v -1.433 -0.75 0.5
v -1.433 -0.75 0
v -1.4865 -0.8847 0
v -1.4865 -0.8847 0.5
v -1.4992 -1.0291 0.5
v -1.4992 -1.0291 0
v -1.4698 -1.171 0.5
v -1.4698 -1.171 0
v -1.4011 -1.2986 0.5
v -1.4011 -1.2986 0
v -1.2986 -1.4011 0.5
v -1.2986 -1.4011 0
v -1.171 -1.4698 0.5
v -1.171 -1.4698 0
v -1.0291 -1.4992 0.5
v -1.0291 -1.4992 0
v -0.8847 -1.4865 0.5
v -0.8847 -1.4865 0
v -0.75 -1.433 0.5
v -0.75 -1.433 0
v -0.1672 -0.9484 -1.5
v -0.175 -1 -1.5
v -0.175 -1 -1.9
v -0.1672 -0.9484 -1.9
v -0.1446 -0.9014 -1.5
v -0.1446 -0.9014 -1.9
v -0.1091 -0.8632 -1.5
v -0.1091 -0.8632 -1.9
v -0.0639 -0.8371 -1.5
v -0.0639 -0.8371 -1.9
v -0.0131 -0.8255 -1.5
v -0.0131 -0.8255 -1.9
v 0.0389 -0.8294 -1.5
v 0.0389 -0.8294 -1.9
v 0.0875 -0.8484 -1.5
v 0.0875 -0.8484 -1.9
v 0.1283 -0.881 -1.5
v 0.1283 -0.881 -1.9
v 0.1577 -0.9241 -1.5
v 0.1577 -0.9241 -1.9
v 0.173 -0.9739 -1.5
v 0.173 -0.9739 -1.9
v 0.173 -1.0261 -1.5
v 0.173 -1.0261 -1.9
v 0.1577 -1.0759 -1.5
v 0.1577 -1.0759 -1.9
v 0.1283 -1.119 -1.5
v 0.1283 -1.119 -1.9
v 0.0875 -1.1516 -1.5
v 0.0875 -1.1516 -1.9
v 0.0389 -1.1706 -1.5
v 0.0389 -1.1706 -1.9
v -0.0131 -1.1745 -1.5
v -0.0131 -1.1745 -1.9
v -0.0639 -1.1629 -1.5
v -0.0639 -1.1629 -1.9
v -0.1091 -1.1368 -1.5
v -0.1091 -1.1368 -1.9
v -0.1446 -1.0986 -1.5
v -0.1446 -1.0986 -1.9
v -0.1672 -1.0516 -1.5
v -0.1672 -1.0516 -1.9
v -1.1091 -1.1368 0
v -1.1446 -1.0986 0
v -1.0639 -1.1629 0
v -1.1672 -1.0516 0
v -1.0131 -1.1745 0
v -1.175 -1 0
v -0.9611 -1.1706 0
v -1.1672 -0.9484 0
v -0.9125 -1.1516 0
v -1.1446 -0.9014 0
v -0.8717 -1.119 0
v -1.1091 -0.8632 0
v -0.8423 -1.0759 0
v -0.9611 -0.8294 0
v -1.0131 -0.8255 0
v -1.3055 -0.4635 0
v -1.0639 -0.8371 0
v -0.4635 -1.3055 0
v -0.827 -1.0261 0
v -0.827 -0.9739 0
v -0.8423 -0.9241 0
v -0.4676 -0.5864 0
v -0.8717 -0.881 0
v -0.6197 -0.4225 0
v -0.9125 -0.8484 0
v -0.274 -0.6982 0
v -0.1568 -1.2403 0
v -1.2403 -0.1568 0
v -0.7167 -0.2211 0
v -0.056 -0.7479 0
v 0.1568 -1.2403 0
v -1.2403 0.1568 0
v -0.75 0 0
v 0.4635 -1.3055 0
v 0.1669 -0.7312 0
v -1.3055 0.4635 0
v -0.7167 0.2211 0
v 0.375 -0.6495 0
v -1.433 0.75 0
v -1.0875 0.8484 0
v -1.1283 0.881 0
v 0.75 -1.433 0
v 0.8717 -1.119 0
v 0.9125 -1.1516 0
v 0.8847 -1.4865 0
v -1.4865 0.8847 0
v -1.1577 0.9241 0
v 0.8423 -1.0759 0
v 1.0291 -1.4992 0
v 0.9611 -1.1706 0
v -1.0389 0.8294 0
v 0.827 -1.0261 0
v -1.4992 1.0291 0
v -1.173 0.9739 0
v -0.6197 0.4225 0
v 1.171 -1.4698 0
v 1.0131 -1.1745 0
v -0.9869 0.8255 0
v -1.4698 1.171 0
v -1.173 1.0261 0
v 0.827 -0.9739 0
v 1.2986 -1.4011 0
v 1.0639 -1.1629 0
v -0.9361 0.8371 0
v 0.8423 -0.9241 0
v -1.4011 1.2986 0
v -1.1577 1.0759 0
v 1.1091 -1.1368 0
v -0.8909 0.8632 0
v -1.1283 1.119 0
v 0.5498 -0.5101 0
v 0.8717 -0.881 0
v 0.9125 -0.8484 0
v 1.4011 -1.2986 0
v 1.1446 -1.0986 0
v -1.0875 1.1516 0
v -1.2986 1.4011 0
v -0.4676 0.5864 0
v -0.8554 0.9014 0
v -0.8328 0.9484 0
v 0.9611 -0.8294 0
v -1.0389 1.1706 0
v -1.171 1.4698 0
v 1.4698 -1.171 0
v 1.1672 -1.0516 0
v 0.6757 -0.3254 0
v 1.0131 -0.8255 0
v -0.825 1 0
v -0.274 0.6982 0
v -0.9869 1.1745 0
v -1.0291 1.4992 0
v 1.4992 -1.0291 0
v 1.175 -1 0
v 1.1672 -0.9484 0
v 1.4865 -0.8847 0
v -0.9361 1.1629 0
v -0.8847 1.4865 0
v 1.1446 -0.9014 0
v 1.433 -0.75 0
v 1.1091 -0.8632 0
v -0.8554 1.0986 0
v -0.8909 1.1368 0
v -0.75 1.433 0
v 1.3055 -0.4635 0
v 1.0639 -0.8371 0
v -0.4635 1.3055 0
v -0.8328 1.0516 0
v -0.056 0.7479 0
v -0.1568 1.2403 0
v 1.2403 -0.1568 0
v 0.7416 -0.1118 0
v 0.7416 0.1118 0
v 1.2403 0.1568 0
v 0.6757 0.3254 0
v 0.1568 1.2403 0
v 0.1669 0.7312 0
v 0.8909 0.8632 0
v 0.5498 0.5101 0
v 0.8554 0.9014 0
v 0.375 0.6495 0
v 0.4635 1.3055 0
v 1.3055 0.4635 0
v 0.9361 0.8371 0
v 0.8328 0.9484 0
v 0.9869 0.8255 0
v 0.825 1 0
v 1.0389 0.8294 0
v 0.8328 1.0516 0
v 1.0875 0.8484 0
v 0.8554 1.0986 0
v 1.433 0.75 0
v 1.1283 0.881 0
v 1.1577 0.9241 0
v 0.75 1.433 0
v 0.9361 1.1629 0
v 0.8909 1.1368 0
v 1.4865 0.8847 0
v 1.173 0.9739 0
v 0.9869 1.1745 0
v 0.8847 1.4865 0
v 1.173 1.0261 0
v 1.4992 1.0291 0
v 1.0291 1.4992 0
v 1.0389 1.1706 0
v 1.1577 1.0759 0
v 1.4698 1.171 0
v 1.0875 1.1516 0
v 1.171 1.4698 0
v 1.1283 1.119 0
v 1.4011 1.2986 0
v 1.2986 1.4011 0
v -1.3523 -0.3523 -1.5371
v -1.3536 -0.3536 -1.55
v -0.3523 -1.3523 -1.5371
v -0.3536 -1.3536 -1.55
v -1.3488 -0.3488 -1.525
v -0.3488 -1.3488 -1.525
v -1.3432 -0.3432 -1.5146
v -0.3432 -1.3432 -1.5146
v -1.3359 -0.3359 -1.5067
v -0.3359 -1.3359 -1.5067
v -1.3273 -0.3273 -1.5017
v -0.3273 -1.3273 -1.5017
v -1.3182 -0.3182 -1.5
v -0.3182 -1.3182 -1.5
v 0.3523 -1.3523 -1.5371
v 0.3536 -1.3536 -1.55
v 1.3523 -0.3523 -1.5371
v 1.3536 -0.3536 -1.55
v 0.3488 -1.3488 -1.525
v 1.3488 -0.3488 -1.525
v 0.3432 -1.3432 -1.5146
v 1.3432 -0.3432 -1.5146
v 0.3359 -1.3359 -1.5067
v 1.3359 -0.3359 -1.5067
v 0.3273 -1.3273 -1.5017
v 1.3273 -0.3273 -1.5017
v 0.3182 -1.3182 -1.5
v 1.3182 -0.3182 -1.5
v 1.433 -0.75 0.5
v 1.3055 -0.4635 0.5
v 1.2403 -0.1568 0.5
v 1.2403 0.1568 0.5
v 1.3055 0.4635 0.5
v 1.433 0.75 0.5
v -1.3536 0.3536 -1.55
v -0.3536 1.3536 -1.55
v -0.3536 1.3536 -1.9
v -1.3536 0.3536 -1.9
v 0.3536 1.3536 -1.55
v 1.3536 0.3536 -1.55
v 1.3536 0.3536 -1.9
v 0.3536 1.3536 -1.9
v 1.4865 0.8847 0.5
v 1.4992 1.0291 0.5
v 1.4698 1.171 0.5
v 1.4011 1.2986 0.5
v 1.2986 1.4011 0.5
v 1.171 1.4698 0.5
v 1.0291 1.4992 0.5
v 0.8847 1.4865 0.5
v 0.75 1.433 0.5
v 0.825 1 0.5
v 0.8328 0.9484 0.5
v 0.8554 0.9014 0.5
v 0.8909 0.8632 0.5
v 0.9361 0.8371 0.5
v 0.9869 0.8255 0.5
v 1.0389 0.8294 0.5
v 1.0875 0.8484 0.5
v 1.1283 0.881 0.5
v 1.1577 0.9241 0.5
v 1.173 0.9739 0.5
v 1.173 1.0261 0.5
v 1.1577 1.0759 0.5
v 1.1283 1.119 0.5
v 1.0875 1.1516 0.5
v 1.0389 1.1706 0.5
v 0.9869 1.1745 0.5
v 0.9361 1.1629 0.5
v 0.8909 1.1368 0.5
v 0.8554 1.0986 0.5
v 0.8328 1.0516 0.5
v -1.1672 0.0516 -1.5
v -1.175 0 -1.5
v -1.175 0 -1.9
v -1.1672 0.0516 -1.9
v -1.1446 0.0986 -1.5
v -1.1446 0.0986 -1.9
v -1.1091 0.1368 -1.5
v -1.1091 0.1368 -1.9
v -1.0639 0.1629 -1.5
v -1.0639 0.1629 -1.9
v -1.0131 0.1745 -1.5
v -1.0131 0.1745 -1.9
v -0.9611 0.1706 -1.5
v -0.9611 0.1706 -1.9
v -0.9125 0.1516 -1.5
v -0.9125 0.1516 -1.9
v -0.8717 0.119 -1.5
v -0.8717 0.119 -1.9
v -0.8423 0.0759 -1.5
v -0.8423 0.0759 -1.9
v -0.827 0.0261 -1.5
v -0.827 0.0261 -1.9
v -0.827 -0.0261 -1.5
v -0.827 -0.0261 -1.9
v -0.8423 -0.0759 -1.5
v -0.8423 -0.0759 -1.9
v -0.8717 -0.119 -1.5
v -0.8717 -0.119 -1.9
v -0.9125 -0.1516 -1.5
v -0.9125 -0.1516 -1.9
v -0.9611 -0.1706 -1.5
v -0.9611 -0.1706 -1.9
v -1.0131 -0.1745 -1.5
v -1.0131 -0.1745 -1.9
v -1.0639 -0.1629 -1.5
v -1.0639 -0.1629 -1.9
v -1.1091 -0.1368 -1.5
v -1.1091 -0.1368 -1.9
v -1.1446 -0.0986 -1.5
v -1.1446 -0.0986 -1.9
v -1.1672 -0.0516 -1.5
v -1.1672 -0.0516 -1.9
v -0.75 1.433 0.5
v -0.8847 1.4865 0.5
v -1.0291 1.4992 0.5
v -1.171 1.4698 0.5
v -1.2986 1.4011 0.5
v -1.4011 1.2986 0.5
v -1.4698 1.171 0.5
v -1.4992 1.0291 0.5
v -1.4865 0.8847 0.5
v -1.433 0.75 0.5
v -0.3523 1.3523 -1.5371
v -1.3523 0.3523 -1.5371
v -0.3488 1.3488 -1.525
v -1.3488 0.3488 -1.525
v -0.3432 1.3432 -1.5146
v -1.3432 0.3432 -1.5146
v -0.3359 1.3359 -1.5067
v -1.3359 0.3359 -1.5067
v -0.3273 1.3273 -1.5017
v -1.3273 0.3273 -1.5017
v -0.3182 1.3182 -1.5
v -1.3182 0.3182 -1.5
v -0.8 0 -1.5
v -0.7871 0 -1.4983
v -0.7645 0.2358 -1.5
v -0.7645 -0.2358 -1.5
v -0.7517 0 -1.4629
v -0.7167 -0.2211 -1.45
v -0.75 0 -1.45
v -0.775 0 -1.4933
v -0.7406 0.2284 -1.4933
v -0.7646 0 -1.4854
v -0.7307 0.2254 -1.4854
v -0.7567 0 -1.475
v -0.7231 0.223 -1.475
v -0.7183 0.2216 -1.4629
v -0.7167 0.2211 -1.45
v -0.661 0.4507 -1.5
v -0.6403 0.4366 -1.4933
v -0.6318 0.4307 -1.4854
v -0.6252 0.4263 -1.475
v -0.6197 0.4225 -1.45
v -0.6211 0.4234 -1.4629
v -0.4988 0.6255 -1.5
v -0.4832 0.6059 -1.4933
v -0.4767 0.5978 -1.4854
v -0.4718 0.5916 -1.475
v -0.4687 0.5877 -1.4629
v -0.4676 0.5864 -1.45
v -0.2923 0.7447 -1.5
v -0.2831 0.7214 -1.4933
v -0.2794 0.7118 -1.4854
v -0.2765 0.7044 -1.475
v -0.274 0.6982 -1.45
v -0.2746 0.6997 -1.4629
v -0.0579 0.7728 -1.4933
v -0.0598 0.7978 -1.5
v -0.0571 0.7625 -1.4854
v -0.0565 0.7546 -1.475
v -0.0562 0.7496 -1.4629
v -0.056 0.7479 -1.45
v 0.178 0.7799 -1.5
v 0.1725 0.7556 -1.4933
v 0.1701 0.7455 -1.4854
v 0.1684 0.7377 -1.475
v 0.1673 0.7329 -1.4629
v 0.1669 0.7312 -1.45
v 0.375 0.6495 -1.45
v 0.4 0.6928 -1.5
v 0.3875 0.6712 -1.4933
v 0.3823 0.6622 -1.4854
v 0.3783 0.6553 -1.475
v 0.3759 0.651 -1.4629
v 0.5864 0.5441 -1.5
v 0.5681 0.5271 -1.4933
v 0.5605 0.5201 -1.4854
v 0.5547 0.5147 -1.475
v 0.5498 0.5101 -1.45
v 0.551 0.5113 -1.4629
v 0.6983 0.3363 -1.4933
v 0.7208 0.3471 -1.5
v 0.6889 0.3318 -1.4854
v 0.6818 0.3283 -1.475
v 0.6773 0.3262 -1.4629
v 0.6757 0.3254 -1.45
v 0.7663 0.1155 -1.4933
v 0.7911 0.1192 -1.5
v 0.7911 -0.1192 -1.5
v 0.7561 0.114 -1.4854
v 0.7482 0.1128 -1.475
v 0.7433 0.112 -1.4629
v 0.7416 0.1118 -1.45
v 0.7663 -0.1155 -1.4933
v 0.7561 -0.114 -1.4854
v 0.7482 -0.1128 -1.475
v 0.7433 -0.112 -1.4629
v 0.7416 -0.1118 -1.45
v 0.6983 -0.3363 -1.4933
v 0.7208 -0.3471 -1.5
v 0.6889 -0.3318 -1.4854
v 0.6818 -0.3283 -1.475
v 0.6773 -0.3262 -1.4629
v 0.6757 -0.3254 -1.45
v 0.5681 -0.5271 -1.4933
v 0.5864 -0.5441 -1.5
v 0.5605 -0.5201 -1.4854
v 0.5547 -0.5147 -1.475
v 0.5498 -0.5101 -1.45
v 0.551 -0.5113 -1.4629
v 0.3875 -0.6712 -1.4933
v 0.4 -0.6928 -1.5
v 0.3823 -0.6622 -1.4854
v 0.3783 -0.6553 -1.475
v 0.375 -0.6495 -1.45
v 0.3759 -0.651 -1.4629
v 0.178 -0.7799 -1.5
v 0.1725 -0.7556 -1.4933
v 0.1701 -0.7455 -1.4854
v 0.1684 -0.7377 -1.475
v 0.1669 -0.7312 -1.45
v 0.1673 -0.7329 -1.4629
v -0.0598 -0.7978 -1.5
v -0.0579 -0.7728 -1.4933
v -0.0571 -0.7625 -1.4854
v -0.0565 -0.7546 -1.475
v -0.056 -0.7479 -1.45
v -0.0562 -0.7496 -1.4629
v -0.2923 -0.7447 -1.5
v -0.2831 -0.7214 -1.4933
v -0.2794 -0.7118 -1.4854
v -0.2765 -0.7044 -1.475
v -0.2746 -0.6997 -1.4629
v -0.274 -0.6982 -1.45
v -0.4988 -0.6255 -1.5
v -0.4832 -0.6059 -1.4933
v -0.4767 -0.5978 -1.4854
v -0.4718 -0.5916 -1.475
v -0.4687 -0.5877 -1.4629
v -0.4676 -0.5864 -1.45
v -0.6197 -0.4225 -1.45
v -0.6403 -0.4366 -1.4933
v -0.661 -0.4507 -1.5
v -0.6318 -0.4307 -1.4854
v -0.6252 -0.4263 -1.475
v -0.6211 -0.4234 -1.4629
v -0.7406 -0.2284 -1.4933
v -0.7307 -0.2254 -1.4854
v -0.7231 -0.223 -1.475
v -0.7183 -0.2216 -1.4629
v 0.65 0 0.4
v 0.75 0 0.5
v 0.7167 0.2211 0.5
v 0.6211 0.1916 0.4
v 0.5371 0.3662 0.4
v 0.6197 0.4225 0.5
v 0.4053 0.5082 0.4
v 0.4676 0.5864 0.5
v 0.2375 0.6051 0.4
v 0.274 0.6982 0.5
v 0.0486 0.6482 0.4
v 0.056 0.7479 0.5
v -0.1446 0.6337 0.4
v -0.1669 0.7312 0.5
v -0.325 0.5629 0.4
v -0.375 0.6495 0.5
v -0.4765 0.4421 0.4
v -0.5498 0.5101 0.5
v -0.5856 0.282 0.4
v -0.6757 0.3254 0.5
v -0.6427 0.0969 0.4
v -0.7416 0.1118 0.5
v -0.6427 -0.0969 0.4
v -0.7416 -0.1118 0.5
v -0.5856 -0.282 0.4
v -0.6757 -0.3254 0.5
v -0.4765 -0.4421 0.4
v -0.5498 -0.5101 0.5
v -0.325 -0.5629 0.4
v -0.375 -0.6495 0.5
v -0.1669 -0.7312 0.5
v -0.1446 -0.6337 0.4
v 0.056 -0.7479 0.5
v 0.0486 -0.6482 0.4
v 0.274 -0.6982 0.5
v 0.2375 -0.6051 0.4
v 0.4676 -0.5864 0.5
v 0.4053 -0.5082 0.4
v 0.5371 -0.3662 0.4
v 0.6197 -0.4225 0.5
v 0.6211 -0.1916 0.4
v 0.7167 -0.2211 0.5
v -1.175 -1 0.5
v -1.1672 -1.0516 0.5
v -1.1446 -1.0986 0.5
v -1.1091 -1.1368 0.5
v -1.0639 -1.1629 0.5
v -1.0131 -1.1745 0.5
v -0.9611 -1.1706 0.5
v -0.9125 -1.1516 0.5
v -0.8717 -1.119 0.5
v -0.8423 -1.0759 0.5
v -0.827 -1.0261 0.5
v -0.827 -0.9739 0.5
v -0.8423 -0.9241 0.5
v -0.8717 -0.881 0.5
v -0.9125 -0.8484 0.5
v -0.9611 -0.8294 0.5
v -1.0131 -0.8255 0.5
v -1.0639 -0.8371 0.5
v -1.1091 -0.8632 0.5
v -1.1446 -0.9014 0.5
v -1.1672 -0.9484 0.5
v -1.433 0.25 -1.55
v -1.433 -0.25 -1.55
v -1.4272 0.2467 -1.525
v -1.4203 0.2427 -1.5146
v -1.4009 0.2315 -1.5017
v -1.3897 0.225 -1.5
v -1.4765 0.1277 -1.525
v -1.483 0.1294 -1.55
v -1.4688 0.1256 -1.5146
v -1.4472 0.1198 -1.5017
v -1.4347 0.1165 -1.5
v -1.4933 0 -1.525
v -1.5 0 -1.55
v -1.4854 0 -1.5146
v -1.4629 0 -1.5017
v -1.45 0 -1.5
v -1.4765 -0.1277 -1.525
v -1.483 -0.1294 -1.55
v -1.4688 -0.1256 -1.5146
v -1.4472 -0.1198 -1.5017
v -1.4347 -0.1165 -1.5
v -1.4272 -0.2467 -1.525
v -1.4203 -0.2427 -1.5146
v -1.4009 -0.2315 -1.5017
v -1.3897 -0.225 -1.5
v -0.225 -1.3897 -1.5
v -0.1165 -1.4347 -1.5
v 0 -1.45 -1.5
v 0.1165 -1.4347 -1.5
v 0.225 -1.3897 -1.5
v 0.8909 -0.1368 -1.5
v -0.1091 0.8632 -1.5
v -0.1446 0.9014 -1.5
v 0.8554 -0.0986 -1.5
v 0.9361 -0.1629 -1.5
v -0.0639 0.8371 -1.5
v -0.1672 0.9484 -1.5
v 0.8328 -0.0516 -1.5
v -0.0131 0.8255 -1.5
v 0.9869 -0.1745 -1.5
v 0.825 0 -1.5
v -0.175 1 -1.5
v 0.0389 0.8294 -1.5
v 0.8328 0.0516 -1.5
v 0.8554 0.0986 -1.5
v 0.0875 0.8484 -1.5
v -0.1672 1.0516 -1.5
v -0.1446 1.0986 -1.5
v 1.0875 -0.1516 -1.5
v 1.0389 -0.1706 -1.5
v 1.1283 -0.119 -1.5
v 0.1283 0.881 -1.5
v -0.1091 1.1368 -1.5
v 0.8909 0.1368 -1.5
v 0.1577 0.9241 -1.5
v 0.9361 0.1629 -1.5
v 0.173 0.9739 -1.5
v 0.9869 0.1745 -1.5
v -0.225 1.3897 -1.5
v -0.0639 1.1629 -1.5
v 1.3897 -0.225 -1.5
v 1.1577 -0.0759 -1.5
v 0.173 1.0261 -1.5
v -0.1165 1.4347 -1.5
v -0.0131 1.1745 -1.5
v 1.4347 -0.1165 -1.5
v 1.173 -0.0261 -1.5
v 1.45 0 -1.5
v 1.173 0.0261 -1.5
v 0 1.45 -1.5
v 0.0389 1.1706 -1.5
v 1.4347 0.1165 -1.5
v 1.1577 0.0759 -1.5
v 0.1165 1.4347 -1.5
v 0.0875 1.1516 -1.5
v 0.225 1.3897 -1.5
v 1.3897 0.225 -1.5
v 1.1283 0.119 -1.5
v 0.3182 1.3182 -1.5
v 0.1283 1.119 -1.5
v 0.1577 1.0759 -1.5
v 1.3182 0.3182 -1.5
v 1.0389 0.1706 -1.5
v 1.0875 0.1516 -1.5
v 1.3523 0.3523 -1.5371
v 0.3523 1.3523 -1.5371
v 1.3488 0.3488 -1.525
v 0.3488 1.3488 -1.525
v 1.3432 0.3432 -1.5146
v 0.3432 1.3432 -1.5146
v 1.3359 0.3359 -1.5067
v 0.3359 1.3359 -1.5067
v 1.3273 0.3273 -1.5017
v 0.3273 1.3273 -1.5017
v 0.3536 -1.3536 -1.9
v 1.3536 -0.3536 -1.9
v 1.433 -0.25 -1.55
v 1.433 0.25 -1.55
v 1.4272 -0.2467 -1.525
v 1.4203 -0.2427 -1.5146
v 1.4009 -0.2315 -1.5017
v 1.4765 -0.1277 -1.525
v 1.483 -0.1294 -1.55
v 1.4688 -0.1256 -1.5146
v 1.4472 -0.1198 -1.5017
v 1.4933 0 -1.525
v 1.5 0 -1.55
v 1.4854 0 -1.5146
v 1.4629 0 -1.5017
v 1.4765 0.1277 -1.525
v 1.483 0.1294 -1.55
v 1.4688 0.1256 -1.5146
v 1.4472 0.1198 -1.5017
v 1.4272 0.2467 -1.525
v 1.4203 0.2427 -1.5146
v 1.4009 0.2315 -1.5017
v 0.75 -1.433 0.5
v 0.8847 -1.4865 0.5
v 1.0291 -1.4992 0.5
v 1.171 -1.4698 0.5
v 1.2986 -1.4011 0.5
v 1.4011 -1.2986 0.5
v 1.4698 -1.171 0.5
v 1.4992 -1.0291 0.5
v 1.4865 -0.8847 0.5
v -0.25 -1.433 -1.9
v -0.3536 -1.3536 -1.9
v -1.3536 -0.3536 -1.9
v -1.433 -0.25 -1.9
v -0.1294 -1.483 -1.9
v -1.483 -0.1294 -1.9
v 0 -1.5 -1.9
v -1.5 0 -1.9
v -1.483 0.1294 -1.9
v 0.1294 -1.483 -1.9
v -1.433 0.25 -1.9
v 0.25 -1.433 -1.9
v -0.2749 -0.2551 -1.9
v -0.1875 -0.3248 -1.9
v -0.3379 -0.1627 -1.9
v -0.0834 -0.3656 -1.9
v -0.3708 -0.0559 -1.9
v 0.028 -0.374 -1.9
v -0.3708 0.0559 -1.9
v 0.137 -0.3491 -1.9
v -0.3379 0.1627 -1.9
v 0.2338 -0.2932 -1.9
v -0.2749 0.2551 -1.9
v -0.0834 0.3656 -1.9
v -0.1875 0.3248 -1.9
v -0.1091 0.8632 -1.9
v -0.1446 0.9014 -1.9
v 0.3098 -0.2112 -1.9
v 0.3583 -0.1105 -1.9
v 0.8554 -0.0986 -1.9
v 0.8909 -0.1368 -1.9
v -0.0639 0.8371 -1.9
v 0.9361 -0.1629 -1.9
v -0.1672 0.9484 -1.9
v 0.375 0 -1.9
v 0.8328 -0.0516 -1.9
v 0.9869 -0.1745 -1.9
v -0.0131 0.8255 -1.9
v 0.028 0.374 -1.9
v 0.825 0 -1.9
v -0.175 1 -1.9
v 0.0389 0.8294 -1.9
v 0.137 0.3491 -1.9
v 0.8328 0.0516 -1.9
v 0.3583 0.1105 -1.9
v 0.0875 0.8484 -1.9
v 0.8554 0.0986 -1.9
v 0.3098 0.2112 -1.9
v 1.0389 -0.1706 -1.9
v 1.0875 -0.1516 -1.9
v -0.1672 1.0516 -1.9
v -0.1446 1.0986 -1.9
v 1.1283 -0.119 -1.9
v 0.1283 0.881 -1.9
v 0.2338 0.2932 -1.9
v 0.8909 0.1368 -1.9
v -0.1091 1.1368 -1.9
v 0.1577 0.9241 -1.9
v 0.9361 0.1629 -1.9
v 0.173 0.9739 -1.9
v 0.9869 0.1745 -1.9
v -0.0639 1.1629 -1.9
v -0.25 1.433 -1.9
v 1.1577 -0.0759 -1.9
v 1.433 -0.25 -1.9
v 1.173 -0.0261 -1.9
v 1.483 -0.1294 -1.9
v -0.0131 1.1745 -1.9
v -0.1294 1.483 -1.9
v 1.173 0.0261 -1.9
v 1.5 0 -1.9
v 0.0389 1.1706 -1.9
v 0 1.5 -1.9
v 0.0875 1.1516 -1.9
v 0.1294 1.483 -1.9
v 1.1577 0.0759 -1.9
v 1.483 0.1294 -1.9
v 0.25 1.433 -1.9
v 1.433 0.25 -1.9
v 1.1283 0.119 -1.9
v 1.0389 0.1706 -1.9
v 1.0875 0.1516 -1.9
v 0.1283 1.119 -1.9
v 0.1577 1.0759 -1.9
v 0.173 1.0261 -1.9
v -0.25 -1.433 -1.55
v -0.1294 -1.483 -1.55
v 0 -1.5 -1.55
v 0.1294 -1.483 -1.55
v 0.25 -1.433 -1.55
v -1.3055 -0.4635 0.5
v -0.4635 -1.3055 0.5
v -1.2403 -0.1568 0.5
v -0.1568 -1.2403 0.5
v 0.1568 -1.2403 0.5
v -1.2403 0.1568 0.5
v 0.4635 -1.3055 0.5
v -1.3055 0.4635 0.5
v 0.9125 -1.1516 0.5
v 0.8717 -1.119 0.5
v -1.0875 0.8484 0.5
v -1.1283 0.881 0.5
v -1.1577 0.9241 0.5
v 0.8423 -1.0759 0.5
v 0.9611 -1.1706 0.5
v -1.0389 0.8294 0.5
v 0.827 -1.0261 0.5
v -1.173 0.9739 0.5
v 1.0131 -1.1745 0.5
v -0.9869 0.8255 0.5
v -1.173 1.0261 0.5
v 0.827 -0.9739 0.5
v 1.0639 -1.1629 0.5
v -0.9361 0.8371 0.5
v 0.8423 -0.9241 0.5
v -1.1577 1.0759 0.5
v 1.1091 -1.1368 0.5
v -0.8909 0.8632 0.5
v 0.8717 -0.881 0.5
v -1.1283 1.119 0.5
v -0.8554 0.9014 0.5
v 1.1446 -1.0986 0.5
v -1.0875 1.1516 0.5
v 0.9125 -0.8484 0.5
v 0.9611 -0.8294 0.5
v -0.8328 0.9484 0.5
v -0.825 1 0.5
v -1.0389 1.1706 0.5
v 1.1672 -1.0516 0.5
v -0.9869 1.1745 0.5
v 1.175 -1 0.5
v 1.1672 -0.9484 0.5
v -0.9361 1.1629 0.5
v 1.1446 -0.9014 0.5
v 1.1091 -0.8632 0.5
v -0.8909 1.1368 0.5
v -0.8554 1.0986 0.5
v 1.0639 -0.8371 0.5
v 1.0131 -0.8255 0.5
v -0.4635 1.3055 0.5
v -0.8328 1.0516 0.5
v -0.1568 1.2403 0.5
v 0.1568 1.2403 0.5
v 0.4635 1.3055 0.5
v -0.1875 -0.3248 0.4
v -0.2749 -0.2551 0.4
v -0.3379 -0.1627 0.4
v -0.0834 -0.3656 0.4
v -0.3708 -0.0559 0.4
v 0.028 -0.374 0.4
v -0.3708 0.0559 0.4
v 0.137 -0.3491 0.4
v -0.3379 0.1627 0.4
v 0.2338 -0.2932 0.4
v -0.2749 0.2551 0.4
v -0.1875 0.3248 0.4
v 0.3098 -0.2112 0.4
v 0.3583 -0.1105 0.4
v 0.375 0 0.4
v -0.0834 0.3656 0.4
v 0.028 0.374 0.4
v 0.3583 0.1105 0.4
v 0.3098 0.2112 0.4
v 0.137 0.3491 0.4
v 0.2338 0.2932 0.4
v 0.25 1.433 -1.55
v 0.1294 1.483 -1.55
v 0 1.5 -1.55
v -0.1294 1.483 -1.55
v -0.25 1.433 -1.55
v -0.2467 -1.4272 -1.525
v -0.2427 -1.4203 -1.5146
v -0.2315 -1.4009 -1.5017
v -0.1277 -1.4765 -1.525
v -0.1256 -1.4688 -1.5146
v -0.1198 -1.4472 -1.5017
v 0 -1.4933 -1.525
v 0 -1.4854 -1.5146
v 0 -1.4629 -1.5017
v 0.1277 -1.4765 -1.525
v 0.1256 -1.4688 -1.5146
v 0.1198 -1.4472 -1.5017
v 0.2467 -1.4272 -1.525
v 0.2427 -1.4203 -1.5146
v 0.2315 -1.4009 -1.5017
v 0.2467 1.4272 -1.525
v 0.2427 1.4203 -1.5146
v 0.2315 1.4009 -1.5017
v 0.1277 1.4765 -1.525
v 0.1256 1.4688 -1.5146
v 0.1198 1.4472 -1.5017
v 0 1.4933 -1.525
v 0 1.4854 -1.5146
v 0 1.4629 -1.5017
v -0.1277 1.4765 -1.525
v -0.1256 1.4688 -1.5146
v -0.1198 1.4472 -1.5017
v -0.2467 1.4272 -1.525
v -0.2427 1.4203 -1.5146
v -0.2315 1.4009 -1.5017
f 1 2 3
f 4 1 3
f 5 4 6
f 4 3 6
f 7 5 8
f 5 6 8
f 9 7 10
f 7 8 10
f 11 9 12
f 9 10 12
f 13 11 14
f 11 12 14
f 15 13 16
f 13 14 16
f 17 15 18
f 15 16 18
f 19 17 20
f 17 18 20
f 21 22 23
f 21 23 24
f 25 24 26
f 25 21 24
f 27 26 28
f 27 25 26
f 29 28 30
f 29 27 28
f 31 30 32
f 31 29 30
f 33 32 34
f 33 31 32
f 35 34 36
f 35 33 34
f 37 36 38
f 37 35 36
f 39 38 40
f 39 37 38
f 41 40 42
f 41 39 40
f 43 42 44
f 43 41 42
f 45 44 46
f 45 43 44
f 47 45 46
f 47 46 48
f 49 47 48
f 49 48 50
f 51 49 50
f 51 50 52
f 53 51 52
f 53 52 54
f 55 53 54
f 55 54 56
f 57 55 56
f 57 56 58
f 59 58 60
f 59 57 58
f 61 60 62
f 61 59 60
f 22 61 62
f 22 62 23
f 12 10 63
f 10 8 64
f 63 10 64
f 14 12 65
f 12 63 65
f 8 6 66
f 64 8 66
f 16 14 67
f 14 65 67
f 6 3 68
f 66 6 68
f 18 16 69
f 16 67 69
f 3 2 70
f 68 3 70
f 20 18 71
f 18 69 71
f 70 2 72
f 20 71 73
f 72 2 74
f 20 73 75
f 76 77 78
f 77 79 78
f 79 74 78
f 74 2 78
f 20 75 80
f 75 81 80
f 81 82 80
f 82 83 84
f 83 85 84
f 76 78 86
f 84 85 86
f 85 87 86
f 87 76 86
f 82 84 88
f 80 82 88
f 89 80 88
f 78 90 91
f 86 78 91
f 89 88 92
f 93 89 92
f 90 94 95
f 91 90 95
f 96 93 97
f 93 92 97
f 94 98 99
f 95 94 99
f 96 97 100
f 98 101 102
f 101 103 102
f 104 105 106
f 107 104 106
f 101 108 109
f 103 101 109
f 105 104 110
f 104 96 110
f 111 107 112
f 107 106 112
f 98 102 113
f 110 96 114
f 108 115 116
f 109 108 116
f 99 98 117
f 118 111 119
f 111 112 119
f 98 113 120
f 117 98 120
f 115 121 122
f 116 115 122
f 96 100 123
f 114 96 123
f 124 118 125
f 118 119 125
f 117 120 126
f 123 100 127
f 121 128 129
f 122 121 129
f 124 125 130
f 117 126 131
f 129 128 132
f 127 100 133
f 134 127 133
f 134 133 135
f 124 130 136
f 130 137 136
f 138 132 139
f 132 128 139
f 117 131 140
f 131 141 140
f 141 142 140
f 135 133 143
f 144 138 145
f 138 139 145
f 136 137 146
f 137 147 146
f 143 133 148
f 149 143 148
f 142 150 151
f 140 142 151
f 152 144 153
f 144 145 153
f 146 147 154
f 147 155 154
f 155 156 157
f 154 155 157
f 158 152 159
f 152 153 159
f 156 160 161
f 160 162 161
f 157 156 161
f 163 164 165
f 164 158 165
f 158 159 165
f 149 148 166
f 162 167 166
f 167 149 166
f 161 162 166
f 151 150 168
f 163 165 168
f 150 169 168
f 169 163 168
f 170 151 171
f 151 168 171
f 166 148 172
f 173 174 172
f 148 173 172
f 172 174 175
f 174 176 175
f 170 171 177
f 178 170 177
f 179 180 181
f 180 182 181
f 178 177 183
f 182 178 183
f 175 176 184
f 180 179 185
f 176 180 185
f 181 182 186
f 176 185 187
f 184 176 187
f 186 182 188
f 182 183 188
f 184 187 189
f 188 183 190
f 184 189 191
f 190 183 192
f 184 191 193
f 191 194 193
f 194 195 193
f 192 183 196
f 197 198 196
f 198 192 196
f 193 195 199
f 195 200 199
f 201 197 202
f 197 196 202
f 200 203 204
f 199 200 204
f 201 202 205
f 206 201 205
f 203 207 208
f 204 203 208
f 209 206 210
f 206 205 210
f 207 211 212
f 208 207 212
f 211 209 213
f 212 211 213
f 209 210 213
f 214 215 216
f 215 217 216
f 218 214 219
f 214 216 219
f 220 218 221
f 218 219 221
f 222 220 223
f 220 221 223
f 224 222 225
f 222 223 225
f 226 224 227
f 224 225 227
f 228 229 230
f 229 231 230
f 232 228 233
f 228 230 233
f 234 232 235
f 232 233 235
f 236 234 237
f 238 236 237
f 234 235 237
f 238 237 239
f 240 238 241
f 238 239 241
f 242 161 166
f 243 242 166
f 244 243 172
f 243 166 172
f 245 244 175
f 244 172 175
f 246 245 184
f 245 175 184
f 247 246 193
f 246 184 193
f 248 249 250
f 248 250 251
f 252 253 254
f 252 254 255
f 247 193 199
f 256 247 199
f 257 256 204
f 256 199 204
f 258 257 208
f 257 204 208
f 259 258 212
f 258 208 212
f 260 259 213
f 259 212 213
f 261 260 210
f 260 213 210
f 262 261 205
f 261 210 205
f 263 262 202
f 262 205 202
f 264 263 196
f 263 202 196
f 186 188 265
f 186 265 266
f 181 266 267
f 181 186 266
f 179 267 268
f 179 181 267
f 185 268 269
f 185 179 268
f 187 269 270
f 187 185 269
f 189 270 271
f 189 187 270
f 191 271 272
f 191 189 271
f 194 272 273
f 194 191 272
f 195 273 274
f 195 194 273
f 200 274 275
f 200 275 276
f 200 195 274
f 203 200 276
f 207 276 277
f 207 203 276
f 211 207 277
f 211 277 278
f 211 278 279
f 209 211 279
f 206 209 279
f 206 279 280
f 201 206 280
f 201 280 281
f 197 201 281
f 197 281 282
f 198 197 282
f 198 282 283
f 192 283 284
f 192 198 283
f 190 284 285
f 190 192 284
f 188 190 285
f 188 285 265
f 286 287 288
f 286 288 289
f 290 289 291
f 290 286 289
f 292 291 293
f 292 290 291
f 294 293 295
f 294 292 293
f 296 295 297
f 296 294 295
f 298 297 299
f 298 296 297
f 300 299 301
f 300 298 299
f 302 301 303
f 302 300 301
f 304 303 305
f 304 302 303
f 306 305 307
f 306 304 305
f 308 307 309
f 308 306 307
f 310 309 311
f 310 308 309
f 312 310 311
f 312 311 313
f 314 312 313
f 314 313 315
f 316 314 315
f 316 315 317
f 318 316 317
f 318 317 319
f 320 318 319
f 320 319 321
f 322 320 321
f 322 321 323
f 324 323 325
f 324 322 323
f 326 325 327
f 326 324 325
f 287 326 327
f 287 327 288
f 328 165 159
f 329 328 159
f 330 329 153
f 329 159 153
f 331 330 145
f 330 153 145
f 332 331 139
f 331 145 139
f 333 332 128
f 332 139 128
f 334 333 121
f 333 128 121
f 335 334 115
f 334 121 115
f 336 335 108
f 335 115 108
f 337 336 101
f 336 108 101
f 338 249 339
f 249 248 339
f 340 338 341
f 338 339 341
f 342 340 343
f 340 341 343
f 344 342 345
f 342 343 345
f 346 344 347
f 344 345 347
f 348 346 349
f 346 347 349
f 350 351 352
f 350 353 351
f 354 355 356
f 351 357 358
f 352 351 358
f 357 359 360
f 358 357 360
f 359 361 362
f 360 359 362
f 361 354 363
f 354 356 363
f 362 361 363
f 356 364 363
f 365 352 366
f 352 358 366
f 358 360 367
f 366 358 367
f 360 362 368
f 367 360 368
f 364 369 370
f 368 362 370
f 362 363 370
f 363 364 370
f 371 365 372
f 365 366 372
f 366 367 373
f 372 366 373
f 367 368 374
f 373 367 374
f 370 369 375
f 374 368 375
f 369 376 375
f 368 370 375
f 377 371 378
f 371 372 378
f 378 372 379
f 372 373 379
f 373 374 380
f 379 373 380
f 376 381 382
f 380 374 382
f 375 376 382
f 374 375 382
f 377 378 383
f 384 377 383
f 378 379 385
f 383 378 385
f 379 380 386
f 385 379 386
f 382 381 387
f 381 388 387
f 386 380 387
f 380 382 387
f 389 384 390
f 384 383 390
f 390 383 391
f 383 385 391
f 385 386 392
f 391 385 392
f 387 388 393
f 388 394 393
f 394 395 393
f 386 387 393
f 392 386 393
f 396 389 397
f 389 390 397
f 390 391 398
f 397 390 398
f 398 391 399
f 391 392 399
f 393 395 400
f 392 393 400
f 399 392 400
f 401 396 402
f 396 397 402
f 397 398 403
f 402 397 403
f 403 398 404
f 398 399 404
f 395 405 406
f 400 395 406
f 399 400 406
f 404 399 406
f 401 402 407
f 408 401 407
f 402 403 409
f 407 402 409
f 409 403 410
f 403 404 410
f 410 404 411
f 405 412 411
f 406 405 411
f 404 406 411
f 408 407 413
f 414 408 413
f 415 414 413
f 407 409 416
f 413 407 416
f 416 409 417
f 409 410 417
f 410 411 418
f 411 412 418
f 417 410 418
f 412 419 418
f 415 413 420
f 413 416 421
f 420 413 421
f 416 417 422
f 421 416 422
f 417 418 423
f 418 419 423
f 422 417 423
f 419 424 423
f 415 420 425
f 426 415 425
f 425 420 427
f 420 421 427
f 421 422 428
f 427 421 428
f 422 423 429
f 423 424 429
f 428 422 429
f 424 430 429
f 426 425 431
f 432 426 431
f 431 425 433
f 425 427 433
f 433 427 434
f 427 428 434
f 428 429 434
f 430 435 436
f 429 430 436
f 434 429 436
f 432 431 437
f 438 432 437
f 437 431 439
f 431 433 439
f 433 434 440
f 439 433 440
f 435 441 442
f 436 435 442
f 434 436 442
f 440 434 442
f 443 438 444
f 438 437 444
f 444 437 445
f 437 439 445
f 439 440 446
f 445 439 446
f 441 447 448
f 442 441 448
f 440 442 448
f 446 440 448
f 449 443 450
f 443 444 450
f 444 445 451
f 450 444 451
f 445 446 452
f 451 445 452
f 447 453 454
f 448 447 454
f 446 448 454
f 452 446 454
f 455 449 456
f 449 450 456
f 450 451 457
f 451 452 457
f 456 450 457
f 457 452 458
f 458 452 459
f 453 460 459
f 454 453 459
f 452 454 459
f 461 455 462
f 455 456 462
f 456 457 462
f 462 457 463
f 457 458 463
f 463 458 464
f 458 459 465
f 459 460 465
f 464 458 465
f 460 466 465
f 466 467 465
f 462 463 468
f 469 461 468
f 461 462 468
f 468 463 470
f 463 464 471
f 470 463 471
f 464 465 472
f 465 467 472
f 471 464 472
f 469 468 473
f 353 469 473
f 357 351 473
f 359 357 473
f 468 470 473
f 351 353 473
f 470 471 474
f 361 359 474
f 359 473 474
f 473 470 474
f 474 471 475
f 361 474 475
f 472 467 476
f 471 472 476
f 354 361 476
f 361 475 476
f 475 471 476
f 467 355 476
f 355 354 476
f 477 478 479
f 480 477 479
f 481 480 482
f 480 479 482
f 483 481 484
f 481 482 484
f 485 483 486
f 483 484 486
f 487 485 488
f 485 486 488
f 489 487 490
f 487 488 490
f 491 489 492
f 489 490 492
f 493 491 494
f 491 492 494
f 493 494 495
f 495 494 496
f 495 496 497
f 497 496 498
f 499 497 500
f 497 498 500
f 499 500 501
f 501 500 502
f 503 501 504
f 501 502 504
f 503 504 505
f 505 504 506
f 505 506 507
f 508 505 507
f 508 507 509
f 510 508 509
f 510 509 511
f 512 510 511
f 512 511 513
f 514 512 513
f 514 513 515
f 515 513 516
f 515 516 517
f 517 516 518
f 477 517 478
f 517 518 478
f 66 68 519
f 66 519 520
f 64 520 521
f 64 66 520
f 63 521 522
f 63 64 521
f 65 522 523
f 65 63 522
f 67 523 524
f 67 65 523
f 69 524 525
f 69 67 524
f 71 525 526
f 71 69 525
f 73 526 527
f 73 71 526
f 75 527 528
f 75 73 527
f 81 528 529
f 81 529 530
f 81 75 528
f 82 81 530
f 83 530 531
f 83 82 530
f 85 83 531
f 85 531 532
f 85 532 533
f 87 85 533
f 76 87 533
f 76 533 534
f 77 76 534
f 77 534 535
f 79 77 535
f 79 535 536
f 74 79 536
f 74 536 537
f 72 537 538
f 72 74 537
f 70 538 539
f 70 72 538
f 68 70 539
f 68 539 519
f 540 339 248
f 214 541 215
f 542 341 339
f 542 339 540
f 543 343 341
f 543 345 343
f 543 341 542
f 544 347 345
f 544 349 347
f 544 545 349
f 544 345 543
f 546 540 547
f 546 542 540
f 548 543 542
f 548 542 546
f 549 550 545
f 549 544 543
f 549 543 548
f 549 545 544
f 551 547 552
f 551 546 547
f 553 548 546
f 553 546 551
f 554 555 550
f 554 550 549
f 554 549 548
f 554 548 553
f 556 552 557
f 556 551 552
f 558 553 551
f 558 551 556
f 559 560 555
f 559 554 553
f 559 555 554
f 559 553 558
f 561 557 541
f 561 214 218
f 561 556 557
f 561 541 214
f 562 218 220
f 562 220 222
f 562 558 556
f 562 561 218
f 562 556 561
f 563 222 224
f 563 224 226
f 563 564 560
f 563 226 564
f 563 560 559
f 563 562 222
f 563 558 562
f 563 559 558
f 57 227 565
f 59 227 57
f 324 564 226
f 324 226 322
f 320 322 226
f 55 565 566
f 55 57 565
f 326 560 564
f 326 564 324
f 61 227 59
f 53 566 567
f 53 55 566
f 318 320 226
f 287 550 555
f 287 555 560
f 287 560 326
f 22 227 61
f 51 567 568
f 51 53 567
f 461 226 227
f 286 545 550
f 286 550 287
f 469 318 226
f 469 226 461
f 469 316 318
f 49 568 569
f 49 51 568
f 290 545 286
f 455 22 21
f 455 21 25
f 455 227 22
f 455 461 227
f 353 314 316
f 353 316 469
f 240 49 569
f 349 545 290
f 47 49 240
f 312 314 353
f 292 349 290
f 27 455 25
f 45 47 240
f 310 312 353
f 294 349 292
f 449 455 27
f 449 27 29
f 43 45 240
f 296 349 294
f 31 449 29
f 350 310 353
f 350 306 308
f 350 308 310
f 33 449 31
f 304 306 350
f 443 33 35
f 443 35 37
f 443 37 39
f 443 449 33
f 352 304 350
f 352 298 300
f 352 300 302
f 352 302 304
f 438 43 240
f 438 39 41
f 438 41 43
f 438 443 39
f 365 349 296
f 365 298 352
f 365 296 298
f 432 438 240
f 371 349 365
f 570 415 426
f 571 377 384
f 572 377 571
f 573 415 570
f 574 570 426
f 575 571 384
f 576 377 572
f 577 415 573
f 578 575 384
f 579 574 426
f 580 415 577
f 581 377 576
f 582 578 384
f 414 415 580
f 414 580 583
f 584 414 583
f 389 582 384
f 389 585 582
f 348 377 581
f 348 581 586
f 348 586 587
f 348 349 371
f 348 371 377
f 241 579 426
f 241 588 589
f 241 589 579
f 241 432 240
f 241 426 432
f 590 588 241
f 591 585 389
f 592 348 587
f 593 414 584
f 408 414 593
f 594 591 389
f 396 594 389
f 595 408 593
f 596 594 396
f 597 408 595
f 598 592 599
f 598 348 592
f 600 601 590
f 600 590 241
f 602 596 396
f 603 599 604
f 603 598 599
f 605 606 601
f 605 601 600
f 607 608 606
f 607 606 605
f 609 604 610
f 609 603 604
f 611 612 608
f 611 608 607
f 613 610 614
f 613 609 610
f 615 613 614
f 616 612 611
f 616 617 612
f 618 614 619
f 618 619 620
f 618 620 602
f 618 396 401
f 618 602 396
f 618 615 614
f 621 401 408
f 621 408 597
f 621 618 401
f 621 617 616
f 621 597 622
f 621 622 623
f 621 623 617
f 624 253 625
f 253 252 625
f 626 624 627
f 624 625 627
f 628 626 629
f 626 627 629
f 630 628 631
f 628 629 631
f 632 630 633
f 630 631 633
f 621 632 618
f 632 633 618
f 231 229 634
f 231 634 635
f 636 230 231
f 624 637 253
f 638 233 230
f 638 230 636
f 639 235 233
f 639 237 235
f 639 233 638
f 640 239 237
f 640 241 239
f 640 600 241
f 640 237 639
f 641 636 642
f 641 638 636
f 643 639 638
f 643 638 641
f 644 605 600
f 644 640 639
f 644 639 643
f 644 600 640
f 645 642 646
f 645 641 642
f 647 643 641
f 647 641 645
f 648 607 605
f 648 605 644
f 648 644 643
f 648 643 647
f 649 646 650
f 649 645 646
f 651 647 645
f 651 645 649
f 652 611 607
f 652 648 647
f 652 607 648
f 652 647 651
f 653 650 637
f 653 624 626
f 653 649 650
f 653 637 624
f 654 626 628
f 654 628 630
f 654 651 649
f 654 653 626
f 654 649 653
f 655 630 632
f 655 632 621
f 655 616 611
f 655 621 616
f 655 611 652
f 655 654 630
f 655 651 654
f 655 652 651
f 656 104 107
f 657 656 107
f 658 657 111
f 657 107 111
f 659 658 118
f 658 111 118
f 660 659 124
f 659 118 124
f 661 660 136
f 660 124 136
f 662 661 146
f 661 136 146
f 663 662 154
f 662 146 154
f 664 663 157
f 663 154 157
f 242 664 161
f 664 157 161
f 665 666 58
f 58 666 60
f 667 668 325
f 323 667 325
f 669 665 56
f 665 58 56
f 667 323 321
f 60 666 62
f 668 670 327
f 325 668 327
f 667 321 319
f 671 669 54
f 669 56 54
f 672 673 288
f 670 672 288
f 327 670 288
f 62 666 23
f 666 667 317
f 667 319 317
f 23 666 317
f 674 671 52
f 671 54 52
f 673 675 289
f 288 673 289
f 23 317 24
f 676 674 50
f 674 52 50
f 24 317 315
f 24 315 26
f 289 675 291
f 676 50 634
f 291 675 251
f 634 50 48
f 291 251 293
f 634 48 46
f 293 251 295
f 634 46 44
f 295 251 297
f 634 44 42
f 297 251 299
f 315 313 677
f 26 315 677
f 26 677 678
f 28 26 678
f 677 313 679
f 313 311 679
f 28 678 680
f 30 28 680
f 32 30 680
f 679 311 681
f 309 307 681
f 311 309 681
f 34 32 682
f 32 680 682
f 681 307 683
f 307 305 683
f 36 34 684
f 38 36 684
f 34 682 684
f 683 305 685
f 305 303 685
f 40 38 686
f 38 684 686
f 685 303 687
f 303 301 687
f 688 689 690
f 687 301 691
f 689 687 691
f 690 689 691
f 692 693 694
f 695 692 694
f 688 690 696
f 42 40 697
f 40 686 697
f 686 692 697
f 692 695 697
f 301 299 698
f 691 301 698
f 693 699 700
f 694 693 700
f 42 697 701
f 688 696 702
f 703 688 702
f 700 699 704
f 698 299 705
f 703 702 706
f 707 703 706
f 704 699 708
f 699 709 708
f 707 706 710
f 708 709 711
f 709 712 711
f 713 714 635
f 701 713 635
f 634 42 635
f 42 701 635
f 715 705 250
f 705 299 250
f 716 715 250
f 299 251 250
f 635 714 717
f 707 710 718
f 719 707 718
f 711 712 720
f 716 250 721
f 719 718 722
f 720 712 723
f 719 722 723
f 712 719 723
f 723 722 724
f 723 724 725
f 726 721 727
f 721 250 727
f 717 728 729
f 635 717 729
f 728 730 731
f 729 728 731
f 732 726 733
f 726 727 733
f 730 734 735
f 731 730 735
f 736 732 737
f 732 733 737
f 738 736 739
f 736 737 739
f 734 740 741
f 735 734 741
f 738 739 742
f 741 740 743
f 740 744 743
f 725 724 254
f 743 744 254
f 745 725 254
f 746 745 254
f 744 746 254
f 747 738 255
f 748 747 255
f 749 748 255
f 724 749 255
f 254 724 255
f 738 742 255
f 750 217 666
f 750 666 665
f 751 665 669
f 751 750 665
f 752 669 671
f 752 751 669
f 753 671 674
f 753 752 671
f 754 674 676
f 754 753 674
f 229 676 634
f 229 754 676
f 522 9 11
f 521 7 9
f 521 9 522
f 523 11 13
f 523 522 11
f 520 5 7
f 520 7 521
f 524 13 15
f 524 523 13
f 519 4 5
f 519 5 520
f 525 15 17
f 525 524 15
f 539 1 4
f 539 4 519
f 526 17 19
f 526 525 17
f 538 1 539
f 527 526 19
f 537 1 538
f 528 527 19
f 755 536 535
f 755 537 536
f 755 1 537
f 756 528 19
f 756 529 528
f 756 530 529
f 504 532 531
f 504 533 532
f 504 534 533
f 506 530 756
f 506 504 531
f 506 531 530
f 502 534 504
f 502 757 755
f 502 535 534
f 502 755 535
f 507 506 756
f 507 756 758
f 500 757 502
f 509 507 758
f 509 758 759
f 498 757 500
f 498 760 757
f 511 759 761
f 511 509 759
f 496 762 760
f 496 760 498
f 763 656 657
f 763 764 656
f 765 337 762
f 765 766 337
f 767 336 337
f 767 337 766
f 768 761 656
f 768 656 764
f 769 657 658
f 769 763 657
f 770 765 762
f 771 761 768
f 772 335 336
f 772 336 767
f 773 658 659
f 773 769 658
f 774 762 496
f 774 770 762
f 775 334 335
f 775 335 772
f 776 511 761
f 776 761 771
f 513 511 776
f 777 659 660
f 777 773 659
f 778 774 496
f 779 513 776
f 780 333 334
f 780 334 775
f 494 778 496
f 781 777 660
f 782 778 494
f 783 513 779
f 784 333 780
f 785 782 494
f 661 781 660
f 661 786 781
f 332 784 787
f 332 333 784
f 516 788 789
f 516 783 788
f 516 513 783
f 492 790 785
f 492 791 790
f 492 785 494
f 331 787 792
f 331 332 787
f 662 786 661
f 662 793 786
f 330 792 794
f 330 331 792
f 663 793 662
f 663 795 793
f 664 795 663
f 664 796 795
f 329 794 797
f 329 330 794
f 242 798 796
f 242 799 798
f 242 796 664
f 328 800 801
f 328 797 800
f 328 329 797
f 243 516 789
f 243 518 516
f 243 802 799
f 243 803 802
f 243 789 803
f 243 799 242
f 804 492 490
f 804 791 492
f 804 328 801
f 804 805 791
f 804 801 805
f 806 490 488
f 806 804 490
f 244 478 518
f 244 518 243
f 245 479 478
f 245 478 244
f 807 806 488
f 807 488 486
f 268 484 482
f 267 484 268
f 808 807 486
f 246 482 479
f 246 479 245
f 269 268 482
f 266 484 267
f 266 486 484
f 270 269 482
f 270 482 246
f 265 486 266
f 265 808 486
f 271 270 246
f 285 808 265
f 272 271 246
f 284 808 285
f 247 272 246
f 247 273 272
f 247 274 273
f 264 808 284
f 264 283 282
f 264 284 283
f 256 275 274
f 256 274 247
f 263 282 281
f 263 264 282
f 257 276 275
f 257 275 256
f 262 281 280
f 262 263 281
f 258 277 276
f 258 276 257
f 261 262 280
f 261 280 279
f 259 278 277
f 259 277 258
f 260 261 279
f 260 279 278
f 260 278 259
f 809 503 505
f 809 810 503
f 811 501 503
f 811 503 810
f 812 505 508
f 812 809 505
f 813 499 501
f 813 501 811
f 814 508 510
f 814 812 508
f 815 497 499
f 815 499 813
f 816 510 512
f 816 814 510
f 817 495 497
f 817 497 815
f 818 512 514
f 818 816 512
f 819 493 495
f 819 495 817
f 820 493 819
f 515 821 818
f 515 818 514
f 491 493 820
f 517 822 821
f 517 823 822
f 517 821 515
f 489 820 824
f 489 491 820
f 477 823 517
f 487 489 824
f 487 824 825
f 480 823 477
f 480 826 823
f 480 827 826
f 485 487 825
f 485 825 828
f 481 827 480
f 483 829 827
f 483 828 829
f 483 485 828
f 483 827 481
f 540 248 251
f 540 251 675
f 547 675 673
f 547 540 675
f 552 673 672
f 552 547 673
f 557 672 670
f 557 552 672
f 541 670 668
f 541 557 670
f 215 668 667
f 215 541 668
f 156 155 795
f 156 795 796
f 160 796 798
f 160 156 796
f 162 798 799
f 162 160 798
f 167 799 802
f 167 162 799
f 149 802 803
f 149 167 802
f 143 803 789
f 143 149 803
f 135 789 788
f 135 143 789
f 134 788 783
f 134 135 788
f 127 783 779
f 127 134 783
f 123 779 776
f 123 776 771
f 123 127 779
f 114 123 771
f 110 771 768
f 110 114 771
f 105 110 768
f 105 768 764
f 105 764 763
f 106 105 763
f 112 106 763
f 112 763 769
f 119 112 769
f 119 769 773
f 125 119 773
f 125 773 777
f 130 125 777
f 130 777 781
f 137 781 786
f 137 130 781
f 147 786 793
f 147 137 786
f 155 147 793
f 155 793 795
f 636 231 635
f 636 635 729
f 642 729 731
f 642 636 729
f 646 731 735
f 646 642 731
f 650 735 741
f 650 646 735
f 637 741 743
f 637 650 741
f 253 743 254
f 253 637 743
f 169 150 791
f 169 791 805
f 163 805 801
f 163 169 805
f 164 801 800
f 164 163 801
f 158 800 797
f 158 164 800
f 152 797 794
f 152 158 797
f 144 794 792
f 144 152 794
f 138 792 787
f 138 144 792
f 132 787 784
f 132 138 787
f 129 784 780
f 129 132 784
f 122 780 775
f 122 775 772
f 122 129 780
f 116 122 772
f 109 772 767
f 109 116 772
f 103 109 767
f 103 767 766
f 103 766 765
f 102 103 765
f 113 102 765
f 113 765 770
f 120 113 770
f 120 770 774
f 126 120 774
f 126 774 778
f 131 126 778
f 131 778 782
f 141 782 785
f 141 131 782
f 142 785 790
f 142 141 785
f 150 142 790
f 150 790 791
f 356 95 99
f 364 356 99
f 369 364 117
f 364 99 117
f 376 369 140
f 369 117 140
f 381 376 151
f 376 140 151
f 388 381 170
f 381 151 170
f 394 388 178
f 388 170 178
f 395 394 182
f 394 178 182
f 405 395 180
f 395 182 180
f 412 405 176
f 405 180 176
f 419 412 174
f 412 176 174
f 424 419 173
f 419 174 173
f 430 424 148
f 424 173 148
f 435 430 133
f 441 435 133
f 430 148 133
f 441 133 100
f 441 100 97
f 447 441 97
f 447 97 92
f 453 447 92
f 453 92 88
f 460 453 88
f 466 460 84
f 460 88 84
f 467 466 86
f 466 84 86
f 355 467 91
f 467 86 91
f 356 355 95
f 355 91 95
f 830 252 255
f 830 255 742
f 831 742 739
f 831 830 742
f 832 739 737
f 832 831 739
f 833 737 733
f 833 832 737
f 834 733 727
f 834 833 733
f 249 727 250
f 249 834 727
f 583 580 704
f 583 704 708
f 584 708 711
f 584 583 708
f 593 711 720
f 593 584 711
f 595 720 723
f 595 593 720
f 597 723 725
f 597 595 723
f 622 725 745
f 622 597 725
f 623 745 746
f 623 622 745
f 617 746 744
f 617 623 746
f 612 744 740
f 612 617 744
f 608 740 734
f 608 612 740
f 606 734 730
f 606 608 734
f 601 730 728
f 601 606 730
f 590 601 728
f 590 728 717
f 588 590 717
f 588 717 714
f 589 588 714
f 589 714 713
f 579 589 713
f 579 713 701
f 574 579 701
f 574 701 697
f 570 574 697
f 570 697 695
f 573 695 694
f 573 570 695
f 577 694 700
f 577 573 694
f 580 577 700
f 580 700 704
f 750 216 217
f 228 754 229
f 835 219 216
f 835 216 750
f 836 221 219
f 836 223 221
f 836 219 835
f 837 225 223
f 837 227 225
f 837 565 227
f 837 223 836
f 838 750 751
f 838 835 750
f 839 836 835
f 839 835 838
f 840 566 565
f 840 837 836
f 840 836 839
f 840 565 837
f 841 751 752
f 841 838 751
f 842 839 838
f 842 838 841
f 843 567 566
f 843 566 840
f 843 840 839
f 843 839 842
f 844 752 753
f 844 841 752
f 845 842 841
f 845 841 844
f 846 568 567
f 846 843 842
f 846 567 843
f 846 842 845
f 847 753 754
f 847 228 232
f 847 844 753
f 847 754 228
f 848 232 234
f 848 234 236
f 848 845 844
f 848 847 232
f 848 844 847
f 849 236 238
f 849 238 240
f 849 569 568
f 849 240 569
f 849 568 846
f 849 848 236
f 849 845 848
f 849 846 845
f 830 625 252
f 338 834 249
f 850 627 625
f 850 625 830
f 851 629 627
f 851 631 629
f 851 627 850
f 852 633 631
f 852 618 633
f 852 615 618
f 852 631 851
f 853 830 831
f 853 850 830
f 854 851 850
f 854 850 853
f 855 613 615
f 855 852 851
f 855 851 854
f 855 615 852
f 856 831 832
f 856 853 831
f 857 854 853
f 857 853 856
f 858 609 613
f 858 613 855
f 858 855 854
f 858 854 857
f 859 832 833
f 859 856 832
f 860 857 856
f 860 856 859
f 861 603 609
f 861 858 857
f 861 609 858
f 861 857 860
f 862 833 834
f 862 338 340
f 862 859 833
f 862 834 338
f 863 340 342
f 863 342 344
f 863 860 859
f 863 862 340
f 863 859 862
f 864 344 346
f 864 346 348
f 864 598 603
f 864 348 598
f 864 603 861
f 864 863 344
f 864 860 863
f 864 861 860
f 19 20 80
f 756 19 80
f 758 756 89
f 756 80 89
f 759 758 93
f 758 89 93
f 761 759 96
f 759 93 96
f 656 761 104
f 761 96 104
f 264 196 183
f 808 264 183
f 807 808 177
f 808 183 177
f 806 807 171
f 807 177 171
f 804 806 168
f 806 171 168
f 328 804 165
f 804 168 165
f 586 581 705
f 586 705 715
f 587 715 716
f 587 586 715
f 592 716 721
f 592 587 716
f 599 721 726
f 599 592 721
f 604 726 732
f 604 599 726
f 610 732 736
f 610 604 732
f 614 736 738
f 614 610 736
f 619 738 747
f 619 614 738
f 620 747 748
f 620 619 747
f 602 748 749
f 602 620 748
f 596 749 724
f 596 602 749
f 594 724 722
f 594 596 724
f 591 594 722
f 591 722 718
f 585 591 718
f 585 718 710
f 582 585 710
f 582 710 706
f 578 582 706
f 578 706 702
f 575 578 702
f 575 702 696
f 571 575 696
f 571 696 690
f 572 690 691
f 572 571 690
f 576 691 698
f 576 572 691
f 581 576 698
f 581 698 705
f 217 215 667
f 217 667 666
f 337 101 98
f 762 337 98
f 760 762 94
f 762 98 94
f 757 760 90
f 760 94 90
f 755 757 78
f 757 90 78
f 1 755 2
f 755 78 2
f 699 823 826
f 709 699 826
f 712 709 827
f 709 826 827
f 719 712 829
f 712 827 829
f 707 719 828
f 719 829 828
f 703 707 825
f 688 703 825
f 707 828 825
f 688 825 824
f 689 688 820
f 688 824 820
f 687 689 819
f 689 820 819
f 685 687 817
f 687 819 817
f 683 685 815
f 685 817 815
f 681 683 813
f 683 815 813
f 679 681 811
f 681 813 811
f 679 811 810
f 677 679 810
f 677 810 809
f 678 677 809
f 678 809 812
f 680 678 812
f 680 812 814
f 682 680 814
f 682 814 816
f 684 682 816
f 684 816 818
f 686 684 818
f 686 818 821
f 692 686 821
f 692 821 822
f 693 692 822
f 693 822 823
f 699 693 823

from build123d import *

# Parameters (mm, degrees)
SKETCH1_R           = 0.175
BOSS_EXTRUDE1_DEPTH = 0.5
SKETCH2_R           = 0.75
CUT_EXTRUDE1_DEPTH  = 0.1
CUT_EXTRUDE1_DRAFT  = -45
SKETCH3_R           = 0.75
BOSS_EXTRUDE2_DEPTH = 1.5
SKETCH4_R           = 0.175
BOSS_EXTRUDE3_DEPTH = 0.4
SKETCH5_R           = 0.375
CUT_EXTRUDE2_DEPTH  = 4.128897569
FILLET1_R           = 0.05


with BuildPart() as part:
    # Sketch1 → Boss-Extrude1 (new body)
    with BuildSketch(Plane.XY):
        with BuildLine():
            ThreePointArc((0.75, 1.433012702), (0, 1.232050808), (-0.75, 1.433012702))
            ThreePointArc((-0.75, 1.433012702), (-1.353553391, 1.353553391), (-1.433012702, 0.75))
            ThreePointArc((-1.433012702, 0.75), (-1.232050808, 0), (-1.433012702, -0.75))
            ThreePointArc((-1.433012702, -0.75), (-1.353553391, -1.353553391), (-0.75, -1.433012702))
            ThreePointArc((-0.75, -1.433012702), (0, -1.232050808), (0.75, -1.433012702))
            ThreePointArc((0.75, -1.433012702), (1.353553391, -1.353553391), (1.433012702, -0.75))
            ThreePointArc((1.433012702, -0.75), (1.232050808, 0), (1.433012702, 0.75))
            ThreePointArc((1.433012702, 0.75), (1.353553391, 1.353553391), (0.75, 1.433012702))
        make_face()
        with Locations((-1, 1)):
            Circle(SKETCH1_R, mode=Mode.SUBTRACT)
        with Locations(Location((1, 1, 0), (0, 0, 180))):
            Circle(SKETCH1_R, mode=Mode.SUBTRACT)
        with Locations(Location((-1, -1, 0), (0, 0, 180))):
            Circle(SKETCH1_R, mode=Mode.SUBTRACT)
        with Locations((1, -1)):
            Circle(SKETCH1_R, mode=Mode.SUBTRACT)
    extrude(amount=BOSS_EXTRUDE1_DEPTH)


with BuildPart() as cut_extrude1_tool:
    # Sketch2 → Cut-Extrude1 (with draft: the straight prism first)
    with BuildSketch(Plane.XY.offset(0.5)):
        Circle(SKETCH2_R)
    extrude(amount=-CUT_EXTRUDE1_DEPTH)
    # Cut-Extrude1: the draft: its side faces are tilted about the plane it starts from
    cut_extrude1_sides = [cut_extrude1_tool.faces().sort_by_distance(p)[0] for p in [
        (-0.75, 0, 0.45),
    ]]
    draft(cut_extrude1_sides, Plane.XY.offset(0.5), CUT_EXTRUDE1_DRAFT)


with BuildPart() as part_1:
    add(part.part)

    # Cut-Extrude1: cut by cut_extrude1_tool
    add(cut_extrude1_tool.part, mode=Mode.SUBTRACT)

    # Sketch3 → Boss-Extrude2 (add)
    with BuildSketch(Plane(origin=(0, 0, 0), x_dir=(-1, 0, 0), z_dir=(0, 0, -1))):
        Circle(SKETCH3_R)
    extrude(amount=BOSS_EXTRUDE2_DEPTH)

    # Sketch4 → Boss-Extrude3 (add)
    with BuildSketch(Plane(origin=(0, 0, -1.5), x_dir=(-1, 0, 0), z_dir=(0, 0, -1))):
        with BuildLine():
            Line((-0.353553391, -1.353553391), (-1.353553391, -0.353553391))
            ThreePointArc((-1.353553391, -0.353553391), (-1.5, 0), (-1.353553391, 0.353553391))
            Line((-1.353553391, 0.353553391), (-0.353553391, 1.353553391))
            ThreePointArc((-0.353553391, 1.353553391), (0, 1.5), (0.353553391, 1.353553391))
            Line((0.353553391, 1.353553391), (1.353553391, 0.353553391))
            ThreePointArc((1.353553391, 0.353553391), (1.5, 0), (1.353553391, -0.353553391))
            Line((1.353553391, -0.353553391), (0.353553391, -1.353553391))
            ThreePointArc((0.353553391, -1.353553391), (0, -1.5), (-0.353553391, -1.353553391))
        make_face()
        with Locations((-1, 0)):
            Circle(SKETCH4_R, mode=Mode.SUBTRACT)
        with Locations((0, 1)):
            Circle(SKETCH4_R, mode=Mode.SUBTRACT)
        with Locations((1, 0)):
            Circle(SKETCH4_R, mode=Mode.SUBTRACT)
        with Locations((0, -1)):
            Circle(SKETCH4_R, mode=Mode.SUBTRACT)
    extrude(amount=BOSS_EXTRUDE3_DEPTH)

    # Sketch5 → Cut-Extrude2 (cut, through all)
    with BuildSketch(Plane.XY.offset(0.4)):
        Circle(SKETCH5_R)
    extrude(amount=-CUT_EXTRUDE2_DEPTH, mode=Mode.SUBTRACT)

    # Fillet1
    fillet1_edges = [part_1.edges().sort_by_distance(p)[0] for p in [
        (0.75, 0, -1.5),
        (1.5, 0, -1.5),
        (0.853553391, -0.853553391, -1.5),
        (0, -1.5, -1.5),
        (-0.853553391, -0.853553391, -1.5),
        (-1.5, 0, -1.5),
        (-0.853553391, 0.853553391, -1.5),
        (0, 1.5, -1.5),
        (0.853553391, 0.853553391, -1.5),
    ]]
    fillet(fillet1_edges, radius=FILLET1_R)


solid = part_1.part
